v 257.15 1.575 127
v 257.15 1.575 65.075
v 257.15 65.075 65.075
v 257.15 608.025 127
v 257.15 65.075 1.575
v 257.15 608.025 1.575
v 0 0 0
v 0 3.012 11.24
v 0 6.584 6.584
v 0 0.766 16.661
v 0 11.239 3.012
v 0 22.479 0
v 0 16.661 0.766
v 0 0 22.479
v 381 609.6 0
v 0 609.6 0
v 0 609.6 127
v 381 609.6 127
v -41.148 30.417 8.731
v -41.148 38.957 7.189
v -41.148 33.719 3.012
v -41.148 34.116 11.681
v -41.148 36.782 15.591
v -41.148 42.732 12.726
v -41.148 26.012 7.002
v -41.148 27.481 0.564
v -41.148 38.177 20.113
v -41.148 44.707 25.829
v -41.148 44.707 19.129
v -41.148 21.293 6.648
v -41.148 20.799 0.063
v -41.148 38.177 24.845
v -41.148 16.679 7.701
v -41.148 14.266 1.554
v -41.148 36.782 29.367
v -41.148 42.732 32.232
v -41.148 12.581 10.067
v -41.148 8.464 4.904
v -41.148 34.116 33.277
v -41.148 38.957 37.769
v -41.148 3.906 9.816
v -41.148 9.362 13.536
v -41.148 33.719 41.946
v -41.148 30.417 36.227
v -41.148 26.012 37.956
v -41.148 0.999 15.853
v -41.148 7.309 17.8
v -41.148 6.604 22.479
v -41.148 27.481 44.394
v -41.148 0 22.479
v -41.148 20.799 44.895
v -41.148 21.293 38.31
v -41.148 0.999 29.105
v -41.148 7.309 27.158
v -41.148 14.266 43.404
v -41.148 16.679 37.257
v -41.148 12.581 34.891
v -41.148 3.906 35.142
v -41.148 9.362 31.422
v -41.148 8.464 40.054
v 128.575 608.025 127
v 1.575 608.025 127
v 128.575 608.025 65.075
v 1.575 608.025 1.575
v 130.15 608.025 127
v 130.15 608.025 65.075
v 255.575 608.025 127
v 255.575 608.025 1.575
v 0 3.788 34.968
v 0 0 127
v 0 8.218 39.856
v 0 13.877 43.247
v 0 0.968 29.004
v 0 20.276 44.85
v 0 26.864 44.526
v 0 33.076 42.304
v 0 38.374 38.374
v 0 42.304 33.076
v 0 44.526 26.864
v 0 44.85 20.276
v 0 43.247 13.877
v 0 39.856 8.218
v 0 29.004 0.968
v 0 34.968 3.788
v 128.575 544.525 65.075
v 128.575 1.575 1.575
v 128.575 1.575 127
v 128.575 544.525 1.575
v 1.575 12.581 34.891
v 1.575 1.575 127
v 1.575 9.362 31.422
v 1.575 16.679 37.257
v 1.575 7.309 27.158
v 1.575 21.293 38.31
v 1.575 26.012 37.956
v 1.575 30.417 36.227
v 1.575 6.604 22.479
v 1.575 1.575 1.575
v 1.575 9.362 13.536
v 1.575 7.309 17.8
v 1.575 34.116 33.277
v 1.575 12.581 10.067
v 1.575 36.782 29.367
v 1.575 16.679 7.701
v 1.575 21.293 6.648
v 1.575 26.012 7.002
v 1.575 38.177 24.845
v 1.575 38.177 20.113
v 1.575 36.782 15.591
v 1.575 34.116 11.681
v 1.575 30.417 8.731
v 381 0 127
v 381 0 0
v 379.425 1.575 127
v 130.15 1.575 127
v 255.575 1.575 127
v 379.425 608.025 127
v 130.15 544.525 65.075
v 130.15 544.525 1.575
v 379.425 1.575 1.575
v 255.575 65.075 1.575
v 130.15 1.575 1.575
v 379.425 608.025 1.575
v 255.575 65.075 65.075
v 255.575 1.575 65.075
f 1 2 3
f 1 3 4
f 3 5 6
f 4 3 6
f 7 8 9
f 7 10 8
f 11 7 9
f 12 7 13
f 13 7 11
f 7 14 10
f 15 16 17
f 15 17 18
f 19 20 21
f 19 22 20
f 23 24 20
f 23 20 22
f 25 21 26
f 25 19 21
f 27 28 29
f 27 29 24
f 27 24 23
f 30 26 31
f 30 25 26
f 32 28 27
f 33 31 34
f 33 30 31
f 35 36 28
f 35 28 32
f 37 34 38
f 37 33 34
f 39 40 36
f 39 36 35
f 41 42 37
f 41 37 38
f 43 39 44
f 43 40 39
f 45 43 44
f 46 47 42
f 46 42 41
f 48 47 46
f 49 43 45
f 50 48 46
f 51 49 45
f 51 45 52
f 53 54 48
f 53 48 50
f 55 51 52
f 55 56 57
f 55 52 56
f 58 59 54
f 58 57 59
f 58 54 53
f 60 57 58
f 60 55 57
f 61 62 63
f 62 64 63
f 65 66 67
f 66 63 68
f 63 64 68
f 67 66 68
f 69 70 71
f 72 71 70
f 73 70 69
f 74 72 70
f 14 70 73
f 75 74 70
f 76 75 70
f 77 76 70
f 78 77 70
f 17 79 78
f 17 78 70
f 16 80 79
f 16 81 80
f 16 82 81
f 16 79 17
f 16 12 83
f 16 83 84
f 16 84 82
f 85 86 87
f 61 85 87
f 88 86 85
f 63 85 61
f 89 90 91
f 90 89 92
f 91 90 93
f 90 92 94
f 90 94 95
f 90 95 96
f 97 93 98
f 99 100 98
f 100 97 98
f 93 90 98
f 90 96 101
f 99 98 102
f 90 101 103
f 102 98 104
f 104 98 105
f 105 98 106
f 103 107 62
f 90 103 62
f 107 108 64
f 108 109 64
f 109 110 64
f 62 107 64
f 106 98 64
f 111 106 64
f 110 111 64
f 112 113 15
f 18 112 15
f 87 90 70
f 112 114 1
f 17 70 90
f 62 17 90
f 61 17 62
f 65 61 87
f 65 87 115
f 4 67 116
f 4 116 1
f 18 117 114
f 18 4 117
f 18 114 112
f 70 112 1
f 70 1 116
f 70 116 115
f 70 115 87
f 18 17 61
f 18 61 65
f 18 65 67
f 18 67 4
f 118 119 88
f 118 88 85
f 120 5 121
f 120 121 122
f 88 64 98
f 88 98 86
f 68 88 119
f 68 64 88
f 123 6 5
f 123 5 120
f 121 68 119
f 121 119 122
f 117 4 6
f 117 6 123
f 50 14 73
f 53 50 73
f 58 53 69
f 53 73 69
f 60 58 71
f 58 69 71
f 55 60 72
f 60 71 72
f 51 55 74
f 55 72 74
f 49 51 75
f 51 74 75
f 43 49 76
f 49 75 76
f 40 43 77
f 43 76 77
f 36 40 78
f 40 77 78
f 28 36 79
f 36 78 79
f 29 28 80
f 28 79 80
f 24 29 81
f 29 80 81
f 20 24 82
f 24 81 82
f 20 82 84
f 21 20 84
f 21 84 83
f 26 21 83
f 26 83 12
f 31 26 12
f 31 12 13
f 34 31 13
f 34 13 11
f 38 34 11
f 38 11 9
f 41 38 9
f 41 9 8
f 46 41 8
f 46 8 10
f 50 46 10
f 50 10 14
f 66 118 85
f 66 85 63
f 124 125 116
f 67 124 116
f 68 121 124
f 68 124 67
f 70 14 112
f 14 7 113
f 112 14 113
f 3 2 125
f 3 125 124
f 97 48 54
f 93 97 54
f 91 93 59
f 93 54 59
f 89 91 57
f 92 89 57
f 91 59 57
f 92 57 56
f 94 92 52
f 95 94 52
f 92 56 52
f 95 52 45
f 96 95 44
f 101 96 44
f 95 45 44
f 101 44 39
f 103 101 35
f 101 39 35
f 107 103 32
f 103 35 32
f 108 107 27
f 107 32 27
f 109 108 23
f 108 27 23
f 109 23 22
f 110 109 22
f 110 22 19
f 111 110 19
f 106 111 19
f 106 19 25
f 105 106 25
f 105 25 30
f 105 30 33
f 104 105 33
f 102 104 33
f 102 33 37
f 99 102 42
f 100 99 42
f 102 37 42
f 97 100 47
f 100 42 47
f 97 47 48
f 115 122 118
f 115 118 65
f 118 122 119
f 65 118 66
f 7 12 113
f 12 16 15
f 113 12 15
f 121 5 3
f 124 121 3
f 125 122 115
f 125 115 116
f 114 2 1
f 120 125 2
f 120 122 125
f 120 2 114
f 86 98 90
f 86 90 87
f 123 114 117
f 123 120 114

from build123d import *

# Parameters (mm, degrees)
F0_W      = 381
F0_H      = 609.6
F1_DEPTH  = 127
F2_T      = -1.5748
F3_W      = 1.5748
F3_H      = 606.4504
F4_DEPTH  = 125.4252
F5_W      = 63.5
F5_H      = 63.5
F6_DEPTH  = 127
F7_W      = 63.5
F7_H      = 63.5
F8_DEPTH  = 128.5748
F9_R      = 22.479
F10_DEPTH = 41.148
F11_R     = 15.875
F12_DEPTH = 42.7228


with BuildPart() as f1:
    # F0 (on Top) → F1 (new body)
    with BuildSketch(Plane.XY):
        with Locations((190.5, 304.8)):
            Rectangle(F0_W, F0_H)
    extrude(amount=F1_DEPTH)

    # F2
    f2_openings = [f1.faces().sort_by_distance(p)[0] for p in [
        (190.5, 304.8, 127),
    ]]
    offset(amount=F2_T, openings=f2_openings)

    # F3 (on face) → F4 (join, through all)
    with BuildSketch(Plane.XY.offset(1.5748)):
        with Locations((129.3622, 304.8)):
            Rectangle(F3_W, F3_H)
        with Locations((256.3622, 304.8)):
            Rectangle(F3_W, F3_H)
    extrude(amount=F4_DEPTH)

    # F5 (on face) → F6 (cut, through all)
    with BuildSketch(Plane.YZ.offset(257.1496)):
        with Locations((33.3248, 33.3248)):
            Rectangle(F5_W, F5_H)
    extrude(amount=-F6_DEPTH, mode=Mode.SUBTRACT)

    # F7 (on face) → F8 (cut, through all)
    with BuildSketch(Plane.YZ.offset(130.1496)):
        with Locations((576.2752, 33.3248)):
            Rectangle(F7_W, F7_H)
    extrude(amount=-F8_DEPTH, mode=Mode.SUBTRACT)

    # F9 (on face) → F10 (join)
    with BuildSketch(Plane(origin=(0, 0, 0), x_dir=(0, -1, 0), z_dir=(-1, 0, 0))):
        with Locations((-22.479, 22.479)):
            Circle(F9_R)
    extrude(amount=F10_DEPTH)

    # F11 (on face) → F12 (cut, through all)
    with BuildSketch(Plane(origin=(-41.148, 0, 0), x_dir=(0, -1, 0), z_dir=(-1, 0, 0))):
        with Locations((-22.479, 22.479)):
            Circle(F11_R)
    extrude(amount=-F12_DEPTH, mode=Mode.SUBTRACT)


solid = f1.part
